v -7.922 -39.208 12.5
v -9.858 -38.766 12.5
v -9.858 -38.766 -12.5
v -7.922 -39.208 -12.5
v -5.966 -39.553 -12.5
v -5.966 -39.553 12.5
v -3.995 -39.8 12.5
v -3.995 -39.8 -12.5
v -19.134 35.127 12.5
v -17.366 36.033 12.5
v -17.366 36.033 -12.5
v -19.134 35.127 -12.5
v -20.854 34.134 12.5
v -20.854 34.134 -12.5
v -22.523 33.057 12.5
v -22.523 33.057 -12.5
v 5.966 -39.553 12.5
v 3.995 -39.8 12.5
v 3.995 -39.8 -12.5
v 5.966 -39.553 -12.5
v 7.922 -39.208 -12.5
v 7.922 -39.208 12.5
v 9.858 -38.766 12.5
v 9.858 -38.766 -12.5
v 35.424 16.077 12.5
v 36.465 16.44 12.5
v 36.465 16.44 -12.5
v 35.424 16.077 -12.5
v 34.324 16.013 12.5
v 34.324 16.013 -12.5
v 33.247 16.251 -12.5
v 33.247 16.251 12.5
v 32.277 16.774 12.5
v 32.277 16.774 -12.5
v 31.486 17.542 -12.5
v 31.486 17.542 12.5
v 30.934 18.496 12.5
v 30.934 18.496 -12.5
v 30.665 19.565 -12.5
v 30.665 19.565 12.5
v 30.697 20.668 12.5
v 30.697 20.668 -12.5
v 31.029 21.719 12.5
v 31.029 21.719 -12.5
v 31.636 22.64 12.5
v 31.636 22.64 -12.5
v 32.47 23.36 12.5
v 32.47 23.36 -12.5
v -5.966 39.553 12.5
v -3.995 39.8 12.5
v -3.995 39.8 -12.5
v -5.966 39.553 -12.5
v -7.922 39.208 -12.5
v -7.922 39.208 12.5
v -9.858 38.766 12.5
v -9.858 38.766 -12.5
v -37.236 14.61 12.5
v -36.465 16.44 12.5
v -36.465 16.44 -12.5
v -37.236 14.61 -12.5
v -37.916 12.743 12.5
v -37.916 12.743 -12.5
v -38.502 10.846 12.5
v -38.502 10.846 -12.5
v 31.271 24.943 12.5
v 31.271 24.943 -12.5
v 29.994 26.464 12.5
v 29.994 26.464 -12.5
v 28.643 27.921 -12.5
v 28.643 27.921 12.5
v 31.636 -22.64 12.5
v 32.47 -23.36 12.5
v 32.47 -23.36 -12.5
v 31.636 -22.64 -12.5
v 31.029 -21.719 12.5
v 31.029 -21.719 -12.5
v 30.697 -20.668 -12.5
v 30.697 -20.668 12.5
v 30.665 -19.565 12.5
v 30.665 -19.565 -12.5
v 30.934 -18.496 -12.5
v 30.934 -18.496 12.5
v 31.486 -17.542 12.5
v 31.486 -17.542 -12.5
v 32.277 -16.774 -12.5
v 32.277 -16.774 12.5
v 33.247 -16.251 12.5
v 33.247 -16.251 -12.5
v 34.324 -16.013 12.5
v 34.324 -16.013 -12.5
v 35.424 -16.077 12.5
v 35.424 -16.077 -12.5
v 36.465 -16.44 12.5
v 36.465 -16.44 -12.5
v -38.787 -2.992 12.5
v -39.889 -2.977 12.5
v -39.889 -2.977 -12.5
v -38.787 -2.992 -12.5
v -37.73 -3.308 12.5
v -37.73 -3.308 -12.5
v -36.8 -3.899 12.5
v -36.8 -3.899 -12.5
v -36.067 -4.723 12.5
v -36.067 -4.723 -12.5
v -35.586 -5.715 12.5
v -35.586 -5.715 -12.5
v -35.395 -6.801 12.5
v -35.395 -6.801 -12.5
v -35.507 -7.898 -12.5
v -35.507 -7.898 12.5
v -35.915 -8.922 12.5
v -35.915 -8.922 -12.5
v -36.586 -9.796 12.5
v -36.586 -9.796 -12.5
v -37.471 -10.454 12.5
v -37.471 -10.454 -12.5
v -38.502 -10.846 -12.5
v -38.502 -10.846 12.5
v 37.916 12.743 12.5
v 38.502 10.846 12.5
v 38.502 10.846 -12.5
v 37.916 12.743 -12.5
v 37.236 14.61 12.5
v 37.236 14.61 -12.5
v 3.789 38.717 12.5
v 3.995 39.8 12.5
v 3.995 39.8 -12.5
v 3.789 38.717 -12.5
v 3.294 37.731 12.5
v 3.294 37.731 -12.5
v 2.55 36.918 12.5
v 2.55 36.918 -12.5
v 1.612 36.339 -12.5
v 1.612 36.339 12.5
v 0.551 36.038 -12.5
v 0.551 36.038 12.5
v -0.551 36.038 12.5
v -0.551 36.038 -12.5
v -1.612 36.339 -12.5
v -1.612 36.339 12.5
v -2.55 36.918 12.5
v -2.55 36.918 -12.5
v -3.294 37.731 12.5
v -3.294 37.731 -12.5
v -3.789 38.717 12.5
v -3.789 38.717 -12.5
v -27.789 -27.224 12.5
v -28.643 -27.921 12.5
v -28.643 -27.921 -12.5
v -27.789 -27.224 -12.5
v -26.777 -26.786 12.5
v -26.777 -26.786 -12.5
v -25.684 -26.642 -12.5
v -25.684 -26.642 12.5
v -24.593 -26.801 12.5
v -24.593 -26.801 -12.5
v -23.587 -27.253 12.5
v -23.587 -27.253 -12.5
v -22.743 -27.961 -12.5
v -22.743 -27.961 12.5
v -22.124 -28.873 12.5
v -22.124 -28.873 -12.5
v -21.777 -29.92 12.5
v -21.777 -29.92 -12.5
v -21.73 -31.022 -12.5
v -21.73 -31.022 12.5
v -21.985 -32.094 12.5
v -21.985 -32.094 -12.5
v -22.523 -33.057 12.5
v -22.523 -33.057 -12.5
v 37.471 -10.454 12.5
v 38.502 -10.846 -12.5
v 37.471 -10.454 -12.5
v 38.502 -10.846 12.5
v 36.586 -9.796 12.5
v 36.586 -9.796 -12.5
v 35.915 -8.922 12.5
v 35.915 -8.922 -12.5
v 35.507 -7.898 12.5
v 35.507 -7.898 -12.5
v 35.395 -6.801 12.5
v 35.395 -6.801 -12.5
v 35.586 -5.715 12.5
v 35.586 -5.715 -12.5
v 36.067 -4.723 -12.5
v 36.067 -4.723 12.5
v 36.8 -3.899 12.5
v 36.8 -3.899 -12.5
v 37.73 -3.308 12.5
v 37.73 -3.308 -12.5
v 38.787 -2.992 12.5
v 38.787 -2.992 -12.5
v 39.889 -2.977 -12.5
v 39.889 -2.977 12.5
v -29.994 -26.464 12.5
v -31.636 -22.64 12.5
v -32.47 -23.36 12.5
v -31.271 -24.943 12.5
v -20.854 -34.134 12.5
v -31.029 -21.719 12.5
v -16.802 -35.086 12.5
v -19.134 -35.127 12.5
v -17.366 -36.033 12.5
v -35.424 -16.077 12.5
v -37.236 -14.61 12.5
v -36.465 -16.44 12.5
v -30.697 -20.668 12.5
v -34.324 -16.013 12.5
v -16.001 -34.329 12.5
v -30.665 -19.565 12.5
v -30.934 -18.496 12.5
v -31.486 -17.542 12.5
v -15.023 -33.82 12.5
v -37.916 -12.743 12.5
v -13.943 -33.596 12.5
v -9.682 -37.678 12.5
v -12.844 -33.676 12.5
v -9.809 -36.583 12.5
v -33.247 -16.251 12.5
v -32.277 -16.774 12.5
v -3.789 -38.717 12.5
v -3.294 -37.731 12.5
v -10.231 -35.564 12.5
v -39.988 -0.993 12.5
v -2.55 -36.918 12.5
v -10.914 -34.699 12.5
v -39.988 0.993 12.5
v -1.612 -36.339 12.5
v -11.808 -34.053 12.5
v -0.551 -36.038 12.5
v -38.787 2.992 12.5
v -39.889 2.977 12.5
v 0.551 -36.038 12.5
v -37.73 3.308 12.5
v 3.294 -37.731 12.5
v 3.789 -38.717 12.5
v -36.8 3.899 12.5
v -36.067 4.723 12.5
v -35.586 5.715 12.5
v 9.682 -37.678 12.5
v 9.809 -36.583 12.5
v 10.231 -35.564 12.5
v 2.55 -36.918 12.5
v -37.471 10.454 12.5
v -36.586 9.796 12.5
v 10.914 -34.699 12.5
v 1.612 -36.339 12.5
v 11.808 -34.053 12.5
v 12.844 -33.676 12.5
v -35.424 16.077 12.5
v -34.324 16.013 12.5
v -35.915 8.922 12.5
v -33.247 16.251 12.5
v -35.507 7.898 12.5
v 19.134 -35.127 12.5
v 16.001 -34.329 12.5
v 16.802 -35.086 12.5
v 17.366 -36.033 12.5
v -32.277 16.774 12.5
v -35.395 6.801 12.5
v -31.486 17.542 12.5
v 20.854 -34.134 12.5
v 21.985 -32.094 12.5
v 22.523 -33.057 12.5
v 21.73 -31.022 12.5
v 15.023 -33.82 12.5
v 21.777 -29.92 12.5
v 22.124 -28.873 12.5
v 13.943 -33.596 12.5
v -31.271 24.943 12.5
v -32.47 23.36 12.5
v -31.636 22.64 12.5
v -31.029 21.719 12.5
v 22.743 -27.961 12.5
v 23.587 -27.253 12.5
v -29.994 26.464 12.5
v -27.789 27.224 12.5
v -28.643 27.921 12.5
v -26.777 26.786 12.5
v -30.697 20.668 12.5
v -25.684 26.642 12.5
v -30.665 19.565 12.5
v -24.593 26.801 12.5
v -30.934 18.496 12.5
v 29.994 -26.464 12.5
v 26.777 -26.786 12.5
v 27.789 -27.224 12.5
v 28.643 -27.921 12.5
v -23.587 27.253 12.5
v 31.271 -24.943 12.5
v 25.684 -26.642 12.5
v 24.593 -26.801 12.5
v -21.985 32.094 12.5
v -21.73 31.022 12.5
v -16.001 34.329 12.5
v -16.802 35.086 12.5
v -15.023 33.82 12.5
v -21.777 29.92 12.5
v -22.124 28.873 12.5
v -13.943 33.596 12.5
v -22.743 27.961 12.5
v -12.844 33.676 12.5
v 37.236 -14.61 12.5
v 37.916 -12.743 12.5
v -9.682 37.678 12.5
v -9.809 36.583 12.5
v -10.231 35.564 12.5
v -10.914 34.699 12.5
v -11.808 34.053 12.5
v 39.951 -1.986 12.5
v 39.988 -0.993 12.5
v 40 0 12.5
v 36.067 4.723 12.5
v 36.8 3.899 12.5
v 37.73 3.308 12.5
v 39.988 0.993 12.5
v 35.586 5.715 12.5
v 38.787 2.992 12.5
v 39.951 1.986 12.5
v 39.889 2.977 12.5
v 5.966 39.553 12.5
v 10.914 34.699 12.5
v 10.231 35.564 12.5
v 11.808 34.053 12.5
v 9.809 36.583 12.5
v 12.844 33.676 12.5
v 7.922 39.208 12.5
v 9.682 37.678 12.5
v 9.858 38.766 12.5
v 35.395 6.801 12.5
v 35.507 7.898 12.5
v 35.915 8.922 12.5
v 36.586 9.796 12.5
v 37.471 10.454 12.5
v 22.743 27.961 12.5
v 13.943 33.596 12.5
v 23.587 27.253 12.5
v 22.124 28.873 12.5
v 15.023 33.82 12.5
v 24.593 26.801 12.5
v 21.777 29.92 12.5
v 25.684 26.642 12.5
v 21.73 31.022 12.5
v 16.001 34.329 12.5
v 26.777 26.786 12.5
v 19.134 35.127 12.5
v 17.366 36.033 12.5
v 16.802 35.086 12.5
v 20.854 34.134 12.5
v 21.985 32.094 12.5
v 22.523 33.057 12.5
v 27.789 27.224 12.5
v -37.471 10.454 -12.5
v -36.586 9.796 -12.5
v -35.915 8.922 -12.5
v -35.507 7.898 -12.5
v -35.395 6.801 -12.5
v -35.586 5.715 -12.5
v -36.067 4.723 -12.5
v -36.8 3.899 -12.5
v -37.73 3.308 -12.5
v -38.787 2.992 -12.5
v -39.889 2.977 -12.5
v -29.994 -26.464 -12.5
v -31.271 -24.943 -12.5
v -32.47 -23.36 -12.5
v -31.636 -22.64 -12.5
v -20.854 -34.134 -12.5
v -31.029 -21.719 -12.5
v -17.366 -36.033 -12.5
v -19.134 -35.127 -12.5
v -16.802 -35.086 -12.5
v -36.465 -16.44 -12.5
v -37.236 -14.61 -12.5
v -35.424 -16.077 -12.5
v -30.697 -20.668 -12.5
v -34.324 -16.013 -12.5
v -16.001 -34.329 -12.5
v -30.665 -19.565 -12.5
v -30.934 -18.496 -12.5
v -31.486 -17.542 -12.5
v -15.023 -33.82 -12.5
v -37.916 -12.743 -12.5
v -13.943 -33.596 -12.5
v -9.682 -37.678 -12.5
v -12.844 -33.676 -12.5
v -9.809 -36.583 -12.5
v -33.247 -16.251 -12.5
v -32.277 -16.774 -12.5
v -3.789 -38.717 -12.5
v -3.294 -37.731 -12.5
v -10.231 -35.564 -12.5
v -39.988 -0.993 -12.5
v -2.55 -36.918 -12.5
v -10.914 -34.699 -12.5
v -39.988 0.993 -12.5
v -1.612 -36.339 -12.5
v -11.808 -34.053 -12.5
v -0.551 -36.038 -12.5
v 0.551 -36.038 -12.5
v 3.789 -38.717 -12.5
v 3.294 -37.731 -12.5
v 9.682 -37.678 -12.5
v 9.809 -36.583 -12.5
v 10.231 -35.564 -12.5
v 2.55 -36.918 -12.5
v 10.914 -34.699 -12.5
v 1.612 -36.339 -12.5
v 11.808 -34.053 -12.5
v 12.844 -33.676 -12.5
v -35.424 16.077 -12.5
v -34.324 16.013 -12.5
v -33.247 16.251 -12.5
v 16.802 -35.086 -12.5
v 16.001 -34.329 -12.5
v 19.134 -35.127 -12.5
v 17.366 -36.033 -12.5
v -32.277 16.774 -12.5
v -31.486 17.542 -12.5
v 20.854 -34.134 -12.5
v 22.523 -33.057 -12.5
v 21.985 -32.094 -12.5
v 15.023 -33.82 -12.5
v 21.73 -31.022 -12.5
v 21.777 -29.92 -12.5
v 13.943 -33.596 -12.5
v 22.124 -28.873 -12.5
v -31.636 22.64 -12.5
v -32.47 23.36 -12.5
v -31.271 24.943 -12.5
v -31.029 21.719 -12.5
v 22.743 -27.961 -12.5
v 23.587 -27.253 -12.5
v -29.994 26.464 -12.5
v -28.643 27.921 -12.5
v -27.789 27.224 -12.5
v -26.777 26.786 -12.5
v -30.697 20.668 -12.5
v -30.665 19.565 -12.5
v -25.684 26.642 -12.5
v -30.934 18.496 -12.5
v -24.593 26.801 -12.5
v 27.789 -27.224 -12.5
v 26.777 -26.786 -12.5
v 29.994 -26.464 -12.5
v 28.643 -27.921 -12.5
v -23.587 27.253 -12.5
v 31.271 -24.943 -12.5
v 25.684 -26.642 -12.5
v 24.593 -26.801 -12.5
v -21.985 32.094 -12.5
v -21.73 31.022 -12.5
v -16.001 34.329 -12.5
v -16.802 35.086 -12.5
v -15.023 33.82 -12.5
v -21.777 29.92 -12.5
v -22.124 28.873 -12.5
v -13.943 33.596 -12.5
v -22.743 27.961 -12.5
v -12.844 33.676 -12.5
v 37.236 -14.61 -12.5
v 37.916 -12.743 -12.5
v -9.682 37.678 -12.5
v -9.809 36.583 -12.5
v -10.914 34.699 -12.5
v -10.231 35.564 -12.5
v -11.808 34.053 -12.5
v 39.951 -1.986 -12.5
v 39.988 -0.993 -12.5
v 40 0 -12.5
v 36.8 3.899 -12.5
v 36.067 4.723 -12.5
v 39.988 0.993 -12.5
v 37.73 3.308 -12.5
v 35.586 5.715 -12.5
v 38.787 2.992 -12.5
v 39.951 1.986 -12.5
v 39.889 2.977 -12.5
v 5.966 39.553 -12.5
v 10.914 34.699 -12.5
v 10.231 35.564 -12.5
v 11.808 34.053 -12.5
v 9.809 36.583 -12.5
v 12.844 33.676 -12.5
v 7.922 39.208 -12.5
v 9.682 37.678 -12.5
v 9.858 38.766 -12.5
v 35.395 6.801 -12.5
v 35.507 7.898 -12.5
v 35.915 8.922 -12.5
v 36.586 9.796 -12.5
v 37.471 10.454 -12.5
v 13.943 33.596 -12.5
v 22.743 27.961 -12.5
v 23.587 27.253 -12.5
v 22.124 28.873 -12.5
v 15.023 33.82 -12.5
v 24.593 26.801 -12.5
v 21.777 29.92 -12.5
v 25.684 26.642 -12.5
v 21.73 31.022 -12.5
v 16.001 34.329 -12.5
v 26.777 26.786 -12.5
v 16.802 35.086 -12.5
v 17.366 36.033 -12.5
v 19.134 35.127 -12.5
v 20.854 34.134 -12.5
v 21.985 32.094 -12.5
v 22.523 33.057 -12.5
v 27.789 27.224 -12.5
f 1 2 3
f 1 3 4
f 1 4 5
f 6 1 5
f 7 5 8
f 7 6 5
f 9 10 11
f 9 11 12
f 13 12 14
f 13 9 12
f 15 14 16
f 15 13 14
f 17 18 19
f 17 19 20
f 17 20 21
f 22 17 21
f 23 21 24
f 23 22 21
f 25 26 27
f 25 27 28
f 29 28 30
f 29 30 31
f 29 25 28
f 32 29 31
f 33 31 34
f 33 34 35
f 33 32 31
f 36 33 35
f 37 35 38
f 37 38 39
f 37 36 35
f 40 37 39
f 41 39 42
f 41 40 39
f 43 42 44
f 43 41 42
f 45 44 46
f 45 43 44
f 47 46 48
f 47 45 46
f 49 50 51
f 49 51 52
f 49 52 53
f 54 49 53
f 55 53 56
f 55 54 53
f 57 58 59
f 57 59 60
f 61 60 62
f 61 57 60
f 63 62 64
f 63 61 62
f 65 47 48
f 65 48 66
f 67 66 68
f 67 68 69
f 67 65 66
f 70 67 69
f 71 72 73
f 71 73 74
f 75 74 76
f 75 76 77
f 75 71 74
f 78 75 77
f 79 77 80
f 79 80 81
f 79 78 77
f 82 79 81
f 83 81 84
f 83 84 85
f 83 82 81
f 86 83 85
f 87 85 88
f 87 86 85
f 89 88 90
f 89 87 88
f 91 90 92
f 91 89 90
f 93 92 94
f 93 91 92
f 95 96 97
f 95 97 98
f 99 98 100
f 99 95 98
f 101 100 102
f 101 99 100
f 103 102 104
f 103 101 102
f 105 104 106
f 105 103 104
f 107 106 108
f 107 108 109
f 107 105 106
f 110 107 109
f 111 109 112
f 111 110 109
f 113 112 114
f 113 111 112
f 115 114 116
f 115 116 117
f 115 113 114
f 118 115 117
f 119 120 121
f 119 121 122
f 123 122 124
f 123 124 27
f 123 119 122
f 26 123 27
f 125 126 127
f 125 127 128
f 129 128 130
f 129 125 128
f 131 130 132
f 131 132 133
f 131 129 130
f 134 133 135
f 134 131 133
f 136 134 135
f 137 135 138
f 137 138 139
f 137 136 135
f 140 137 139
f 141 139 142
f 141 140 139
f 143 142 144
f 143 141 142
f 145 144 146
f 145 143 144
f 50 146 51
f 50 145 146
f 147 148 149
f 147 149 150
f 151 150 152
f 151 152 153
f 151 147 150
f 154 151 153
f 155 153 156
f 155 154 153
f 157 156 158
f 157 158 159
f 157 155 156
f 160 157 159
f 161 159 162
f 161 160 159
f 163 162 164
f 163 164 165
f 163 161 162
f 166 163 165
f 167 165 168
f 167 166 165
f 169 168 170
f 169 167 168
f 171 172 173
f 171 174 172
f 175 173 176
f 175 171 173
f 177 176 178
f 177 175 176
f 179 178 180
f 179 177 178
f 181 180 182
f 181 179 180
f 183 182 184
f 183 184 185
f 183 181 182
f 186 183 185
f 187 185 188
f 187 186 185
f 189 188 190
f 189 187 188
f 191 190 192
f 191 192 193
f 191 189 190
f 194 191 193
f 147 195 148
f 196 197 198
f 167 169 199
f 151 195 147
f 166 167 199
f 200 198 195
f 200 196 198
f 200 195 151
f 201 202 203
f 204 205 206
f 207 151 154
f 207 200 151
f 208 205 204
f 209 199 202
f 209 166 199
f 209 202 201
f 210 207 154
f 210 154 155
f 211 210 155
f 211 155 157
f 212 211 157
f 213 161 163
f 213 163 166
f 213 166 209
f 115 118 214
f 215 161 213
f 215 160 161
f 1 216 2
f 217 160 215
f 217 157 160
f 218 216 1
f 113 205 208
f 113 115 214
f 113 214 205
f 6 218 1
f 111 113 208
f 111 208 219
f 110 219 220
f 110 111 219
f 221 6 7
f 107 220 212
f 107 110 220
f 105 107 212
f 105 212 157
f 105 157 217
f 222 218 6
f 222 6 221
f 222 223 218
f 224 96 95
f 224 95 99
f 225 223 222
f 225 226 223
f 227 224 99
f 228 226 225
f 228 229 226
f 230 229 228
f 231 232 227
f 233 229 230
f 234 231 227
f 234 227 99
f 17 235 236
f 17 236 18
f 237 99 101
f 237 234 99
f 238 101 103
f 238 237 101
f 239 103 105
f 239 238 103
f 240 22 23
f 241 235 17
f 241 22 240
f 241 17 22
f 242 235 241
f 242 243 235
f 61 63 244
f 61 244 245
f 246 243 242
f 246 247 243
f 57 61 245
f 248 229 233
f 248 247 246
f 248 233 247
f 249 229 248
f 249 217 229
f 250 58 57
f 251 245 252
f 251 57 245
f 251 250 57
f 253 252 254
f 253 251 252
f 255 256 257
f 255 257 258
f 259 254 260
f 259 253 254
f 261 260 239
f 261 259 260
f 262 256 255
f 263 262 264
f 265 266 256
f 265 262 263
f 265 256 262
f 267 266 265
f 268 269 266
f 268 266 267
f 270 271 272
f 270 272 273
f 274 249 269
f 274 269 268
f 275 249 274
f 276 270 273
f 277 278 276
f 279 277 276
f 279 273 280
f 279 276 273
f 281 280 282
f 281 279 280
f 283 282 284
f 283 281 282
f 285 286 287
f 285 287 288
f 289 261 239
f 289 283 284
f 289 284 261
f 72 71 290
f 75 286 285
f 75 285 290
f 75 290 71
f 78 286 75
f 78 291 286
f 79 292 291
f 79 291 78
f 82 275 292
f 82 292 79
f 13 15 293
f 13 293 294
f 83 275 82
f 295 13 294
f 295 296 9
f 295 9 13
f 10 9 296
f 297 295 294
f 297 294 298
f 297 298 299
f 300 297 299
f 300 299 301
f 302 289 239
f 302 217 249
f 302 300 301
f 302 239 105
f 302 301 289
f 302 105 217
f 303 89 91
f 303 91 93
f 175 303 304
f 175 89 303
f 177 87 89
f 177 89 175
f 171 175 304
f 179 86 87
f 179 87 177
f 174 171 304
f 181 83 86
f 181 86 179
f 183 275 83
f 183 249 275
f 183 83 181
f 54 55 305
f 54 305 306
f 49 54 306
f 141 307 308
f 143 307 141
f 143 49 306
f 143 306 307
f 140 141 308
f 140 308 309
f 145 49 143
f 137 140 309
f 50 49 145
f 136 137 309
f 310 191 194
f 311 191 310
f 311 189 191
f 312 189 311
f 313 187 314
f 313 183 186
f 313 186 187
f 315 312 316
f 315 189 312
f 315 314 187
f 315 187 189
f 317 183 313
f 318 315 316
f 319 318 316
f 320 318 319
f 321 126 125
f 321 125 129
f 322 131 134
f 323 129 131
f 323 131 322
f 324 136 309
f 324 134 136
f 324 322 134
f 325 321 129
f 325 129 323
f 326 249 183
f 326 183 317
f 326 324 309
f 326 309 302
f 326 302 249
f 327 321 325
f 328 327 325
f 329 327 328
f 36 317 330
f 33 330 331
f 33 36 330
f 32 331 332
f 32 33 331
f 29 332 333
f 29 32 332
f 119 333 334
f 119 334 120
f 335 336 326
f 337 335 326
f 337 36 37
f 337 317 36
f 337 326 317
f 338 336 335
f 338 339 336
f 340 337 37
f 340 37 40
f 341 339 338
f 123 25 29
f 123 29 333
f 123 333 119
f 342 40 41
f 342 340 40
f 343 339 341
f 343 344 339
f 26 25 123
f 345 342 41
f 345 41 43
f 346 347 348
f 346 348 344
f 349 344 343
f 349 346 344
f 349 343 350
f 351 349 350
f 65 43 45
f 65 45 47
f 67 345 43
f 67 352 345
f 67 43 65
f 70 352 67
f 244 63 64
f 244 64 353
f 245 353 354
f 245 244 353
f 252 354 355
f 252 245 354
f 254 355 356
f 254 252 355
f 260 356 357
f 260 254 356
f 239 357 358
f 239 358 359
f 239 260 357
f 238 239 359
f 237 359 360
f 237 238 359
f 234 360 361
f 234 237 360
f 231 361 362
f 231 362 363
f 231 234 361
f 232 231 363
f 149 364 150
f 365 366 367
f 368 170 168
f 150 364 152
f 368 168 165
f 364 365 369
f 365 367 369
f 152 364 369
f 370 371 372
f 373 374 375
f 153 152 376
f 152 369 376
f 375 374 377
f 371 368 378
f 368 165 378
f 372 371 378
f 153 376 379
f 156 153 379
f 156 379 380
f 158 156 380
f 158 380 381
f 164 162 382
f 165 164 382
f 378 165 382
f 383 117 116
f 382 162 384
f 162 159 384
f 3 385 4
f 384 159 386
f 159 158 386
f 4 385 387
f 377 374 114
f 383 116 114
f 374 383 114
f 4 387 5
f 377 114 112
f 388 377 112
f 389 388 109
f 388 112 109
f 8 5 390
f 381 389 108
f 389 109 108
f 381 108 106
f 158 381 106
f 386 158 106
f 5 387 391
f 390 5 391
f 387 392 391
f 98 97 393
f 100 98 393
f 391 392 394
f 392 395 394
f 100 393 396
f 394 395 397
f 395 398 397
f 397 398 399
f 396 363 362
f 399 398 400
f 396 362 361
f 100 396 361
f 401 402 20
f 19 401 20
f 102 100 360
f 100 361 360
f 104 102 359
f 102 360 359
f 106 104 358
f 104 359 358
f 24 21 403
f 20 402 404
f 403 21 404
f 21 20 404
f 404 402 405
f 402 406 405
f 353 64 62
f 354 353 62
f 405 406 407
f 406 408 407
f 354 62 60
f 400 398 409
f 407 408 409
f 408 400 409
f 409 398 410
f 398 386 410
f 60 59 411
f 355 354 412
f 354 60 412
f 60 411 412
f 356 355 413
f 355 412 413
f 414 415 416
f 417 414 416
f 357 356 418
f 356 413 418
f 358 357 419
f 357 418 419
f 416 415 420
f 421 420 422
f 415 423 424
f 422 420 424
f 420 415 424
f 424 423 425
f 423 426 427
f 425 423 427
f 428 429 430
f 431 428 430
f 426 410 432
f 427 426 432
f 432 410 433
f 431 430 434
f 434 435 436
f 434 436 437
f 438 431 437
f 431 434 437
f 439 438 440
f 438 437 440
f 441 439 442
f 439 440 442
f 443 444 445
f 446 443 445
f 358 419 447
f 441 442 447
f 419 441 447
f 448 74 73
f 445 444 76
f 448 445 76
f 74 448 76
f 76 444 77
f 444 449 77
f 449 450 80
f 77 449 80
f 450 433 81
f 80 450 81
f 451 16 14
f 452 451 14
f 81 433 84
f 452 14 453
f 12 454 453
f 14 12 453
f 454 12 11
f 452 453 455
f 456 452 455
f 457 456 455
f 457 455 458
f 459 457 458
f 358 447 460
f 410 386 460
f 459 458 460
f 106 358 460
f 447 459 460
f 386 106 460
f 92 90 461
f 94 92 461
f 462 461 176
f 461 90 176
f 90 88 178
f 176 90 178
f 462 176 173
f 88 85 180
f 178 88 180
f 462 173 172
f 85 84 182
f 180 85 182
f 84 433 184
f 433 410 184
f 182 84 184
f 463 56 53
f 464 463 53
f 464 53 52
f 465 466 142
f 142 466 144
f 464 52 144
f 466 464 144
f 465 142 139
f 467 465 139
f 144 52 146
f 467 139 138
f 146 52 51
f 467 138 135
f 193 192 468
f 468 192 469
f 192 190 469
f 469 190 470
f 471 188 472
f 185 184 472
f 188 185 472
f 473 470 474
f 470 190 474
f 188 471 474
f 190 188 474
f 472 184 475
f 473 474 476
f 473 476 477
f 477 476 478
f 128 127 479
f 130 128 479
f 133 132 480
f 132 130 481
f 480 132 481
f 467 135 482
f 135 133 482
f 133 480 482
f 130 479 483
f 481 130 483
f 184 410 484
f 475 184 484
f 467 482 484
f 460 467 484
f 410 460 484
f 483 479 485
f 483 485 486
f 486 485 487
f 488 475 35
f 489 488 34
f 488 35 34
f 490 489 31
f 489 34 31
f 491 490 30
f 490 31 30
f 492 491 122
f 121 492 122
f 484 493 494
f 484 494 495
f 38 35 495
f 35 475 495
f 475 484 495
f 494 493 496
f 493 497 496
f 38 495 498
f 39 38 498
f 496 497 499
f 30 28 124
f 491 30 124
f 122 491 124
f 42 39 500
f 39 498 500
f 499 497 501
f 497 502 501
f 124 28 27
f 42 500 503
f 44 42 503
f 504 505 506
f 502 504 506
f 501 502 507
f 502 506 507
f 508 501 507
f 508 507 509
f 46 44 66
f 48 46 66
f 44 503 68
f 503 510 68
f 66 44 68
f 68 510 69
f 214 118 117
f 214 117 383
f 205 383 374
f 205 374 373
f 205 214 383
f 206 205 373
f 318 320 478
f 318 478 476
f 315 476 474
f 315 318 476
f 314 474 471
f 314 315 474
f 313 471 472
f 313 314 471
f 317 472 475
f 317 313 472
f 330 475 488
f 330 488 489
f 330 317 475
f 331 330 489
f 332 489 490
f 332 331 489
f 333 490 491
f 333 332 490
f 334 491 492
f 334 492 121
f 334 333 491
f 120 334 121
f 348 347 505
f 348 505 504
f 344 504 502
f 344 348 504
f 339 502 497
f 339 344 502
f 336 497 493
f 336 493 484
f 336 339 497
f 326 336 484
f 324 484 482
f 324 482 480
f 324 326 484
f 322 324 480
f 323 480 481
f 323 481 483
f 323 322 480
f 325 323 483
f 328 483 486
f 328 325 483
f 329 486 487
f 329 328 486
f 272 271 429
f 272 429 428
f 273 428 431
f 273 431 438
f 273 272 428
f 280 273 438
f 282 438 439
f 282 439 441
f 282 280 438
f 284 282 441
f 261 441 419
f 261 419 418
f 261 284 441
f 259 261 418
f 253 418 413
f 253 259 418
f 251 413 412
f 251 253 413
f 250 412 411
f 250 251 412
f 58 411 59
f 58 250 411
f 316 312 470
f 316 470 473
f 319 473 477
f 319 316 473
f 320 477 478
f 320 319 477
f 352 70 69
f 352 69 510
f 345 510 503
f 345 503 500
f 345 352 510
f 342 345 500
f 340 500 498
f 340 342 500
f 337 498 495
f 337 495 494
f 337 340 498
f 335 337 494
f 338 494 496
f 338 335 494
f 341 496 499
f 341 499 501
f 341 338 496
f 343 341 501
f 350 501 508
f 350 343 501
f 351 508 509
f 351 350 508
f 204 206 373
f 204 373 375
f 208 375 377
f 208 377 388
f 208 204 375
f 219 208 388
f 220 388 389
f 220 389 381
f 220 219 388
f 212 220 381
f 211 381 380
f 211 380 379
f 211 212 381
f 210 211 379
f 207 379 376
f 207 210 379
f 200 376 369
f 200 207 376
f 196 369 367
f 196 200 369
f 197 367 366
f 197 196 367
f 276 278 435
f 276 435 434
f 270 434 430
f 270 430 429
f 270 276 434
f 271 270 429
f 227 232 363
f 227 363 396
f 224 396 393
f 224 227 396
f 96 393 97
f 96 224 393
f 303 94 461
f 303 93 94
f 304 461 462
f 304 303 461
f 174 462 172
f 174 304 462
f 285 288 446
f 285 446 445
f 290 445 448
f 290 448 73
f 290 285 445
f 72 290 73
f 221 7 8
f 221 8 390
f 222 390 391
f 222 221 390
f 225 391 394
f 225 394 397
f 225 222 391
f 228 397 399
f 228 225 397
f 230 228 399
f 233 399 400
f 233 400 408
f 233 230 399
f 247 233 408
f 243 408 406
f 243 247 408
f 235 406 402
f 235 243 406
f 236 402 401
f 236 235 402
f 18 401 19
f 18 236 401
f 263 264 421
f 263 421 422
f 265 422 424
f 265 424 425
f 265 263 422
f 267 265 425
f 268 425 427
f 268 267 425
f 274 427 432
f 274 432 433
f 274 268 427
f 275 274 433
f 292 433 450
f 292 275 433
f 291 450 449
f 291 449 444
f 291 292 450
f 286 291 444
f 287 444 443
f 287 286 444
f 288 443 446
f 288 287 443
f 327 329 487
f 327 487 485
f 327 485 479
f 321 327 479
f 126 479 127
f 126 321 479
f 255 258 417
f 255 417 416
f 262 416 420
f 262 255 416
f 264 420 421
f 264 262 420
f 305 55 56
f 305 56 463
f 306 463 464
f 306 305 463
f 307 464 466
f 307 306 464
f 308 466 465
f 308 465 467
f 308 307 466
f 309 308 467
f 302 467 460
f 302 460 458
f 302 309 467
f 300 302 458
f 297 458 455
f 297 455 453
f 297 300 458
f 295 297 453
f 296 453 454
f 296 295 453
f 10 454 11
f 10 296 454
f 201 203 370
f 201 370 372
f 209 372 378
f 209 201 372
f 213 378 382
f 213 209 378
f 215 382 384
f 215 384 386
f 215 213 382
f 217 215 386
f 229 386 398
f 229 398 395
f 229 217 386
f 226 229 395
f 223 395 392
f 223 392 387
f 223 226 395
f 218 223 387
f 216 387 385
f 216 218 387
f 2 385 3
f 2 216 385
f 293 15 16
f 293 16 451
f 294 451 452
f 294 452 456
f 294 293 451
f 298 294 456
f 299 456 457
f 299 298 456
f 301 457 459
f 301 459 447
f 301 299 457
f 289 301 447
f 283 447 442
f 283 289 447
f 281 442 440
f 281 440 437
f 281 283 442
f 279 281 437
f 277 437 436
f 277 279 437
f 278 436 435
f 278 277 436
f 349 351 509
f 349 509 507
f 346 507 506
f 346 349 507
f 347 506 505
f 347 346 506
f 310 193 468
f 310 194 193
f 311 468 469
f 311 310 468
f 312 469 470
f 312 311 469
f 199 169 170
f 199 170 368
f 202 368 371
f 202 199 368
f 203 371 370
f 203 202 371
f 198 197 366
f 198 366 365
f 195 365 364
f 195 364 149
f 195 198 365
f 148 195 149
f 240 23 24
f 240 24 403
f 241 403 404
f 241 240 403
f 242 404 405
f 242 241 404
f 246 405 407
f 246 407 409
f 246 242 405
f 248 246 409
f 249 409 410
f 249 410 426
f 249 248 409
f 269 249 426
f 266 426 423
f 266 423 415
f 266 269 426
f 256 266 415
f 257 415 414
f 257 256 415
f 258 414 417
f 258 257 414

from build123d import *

# Parameters (mm, degrees)
F1_DEPTH = 12.5


with BuildPart() as f1:
    # F0 (on Top) → F1 (new body, symmetric)
    with BuildSketch(Plane.XY):
        with BuildLine():
            ThreePointArc((39.889072, -2.976894), (39.972259, -1.48948), (40, 0))
            ThreePointArc((40, 0), (39.972259, 1.48948), (39.889072, 2.976894))
            ThreePointArc((39.889072, 2.976894), (35.453079, 6.251334), (38.501625, 10.845501))
            ThreePointArc((38.501625, 10.845501), (37.587705, 13.680806), (36.46531, 16.440231))
            ThreePointArc((36.46531, 16.440231), (31.176915, 18), (32.470313, 23.359769))
            ThreePointArc((32.470313, 23.359769), (30.641778, 25.711504), (28.643292, 27.920634))
            ThreePointArc((28.643292, 27.920634), (23.140354, 27.5776), (22.522602, 33.056503))
            ThreePointArc((22.522602, 33.056503), (20, 34.641016), (17.366471, 36.033397))
            ThreePointArc((17.366471, 36.033397), (12.312725, 33.828934), (9.858333, 38.766136))
            ThreePointArc((9.858333, 38.766136), (6.945927, 39.39231), (3.994997, 39.8))
            ThreePointArc((3.994997, 39.8), (0, 36), (-3.994997, 39.8))
            ThreePointArc((-3.994997, 39.8), (-6.945927, 39.39231), (-9.858333, 38.766136))
            ThreePointArc((-9.858333, 38.766136), (-12.312725, 33.828934), (-17.366471, 36.033397))
            ThreePointArc((-17.366471, 36.033397), (-20, 34.641016), (-22.522602, 33.056503))
            ThreePointArc((-22.522602, 33.056503), (-23.140354, 27.5776), (-28.643292, 27.920634))
            ThreePointArc((-28.643292, 27.920634), (-30.641778, 25.711504), (-32.470313, 23.359769))
            ThreePointArc((-32.470313, 23.359769), (-31.176915, 18), (-36.46531, 16.440231))
            ThreePointArc((-36.46531, 16.440231), (-37.587705, 13.680806), (-38.501625, 10.845501))
            ThreePointArc((-38.501625, 10.845501), (-35.453079, 6.251334), (-39.889072, 2.976894))
            ThreePointArc((-39.889072, 2.976894), (-40, 0), (-39.889072, -2.976894))
            ThreePointArc((-39.889072, -2.976894), (-35.453079, -6.251334), (-38.501625, -10.845501))
            ThreePointArc((-38.501625, -10.845501), (-37.587705, -13.680806), (-36.46531, -16.440231))
            ThreePointArc((-36.46531, -16.440231), (-31.176915, -18), (-32.470313, -23.359769))
            ThreePointArc((-32.470313, -23.359769), (-30.641778, -25.711504), (-28.643292, -27.920634))
            ThreePointArc((-28.643292, -27.920634), (-23.140354, -27.5776), (-22.522602, -33.056503))
            ThreePointArc((-22.522602, -33.056503), (-20, -34.641016), (-17.366471, -36.033397))
            ThreePointArc((-17.366471, -36.033397), (-12.312725, -33.828934), (-9.858333, -38.766136))
            ThreePointArc((-9.858333, -38.766136), (-6.945927, -39.39231), (-3.994997, -39.8))
            ThreePointArc((-3.994997, -39.8), (0, -36), (3.994997, -39.8))
            ThreePointArc((3.994997, -39.8), (6.945927, -39.39231), (9.858333, -38.766136))
            ThreePointArc((9.858333, -38.766136), (12.312725, -33.828934), (17.366471, -36.033397))
            ThreePointArc((17.366471, -36.033397), (20, -34.641016), (22.522602, -33.056503))
            ThreePointArc((22.522602, -33.056503), (23.140354, -27.5776), (28.643292, -27.920634))
            ThreePointArc((28.643292, -27.920634), (30.641778, -25.711504), (32.470313, -23.359769))
            ThreePointArc((32.470313, -23.359769), (31.176915, -18), (36.46531, -16.440231))
            ThreePointArc((36.46531, -16.440231), (37.587705, -13.680806), (38.501625, -10.845501))
            ThreePointArc((38.501625, -10.845501), (35.453079, -6.251334), (39.889072, -2.976894))
        make_face()
    extrude(amount=F1_DEPTH, both=True)


solid = f1.part
